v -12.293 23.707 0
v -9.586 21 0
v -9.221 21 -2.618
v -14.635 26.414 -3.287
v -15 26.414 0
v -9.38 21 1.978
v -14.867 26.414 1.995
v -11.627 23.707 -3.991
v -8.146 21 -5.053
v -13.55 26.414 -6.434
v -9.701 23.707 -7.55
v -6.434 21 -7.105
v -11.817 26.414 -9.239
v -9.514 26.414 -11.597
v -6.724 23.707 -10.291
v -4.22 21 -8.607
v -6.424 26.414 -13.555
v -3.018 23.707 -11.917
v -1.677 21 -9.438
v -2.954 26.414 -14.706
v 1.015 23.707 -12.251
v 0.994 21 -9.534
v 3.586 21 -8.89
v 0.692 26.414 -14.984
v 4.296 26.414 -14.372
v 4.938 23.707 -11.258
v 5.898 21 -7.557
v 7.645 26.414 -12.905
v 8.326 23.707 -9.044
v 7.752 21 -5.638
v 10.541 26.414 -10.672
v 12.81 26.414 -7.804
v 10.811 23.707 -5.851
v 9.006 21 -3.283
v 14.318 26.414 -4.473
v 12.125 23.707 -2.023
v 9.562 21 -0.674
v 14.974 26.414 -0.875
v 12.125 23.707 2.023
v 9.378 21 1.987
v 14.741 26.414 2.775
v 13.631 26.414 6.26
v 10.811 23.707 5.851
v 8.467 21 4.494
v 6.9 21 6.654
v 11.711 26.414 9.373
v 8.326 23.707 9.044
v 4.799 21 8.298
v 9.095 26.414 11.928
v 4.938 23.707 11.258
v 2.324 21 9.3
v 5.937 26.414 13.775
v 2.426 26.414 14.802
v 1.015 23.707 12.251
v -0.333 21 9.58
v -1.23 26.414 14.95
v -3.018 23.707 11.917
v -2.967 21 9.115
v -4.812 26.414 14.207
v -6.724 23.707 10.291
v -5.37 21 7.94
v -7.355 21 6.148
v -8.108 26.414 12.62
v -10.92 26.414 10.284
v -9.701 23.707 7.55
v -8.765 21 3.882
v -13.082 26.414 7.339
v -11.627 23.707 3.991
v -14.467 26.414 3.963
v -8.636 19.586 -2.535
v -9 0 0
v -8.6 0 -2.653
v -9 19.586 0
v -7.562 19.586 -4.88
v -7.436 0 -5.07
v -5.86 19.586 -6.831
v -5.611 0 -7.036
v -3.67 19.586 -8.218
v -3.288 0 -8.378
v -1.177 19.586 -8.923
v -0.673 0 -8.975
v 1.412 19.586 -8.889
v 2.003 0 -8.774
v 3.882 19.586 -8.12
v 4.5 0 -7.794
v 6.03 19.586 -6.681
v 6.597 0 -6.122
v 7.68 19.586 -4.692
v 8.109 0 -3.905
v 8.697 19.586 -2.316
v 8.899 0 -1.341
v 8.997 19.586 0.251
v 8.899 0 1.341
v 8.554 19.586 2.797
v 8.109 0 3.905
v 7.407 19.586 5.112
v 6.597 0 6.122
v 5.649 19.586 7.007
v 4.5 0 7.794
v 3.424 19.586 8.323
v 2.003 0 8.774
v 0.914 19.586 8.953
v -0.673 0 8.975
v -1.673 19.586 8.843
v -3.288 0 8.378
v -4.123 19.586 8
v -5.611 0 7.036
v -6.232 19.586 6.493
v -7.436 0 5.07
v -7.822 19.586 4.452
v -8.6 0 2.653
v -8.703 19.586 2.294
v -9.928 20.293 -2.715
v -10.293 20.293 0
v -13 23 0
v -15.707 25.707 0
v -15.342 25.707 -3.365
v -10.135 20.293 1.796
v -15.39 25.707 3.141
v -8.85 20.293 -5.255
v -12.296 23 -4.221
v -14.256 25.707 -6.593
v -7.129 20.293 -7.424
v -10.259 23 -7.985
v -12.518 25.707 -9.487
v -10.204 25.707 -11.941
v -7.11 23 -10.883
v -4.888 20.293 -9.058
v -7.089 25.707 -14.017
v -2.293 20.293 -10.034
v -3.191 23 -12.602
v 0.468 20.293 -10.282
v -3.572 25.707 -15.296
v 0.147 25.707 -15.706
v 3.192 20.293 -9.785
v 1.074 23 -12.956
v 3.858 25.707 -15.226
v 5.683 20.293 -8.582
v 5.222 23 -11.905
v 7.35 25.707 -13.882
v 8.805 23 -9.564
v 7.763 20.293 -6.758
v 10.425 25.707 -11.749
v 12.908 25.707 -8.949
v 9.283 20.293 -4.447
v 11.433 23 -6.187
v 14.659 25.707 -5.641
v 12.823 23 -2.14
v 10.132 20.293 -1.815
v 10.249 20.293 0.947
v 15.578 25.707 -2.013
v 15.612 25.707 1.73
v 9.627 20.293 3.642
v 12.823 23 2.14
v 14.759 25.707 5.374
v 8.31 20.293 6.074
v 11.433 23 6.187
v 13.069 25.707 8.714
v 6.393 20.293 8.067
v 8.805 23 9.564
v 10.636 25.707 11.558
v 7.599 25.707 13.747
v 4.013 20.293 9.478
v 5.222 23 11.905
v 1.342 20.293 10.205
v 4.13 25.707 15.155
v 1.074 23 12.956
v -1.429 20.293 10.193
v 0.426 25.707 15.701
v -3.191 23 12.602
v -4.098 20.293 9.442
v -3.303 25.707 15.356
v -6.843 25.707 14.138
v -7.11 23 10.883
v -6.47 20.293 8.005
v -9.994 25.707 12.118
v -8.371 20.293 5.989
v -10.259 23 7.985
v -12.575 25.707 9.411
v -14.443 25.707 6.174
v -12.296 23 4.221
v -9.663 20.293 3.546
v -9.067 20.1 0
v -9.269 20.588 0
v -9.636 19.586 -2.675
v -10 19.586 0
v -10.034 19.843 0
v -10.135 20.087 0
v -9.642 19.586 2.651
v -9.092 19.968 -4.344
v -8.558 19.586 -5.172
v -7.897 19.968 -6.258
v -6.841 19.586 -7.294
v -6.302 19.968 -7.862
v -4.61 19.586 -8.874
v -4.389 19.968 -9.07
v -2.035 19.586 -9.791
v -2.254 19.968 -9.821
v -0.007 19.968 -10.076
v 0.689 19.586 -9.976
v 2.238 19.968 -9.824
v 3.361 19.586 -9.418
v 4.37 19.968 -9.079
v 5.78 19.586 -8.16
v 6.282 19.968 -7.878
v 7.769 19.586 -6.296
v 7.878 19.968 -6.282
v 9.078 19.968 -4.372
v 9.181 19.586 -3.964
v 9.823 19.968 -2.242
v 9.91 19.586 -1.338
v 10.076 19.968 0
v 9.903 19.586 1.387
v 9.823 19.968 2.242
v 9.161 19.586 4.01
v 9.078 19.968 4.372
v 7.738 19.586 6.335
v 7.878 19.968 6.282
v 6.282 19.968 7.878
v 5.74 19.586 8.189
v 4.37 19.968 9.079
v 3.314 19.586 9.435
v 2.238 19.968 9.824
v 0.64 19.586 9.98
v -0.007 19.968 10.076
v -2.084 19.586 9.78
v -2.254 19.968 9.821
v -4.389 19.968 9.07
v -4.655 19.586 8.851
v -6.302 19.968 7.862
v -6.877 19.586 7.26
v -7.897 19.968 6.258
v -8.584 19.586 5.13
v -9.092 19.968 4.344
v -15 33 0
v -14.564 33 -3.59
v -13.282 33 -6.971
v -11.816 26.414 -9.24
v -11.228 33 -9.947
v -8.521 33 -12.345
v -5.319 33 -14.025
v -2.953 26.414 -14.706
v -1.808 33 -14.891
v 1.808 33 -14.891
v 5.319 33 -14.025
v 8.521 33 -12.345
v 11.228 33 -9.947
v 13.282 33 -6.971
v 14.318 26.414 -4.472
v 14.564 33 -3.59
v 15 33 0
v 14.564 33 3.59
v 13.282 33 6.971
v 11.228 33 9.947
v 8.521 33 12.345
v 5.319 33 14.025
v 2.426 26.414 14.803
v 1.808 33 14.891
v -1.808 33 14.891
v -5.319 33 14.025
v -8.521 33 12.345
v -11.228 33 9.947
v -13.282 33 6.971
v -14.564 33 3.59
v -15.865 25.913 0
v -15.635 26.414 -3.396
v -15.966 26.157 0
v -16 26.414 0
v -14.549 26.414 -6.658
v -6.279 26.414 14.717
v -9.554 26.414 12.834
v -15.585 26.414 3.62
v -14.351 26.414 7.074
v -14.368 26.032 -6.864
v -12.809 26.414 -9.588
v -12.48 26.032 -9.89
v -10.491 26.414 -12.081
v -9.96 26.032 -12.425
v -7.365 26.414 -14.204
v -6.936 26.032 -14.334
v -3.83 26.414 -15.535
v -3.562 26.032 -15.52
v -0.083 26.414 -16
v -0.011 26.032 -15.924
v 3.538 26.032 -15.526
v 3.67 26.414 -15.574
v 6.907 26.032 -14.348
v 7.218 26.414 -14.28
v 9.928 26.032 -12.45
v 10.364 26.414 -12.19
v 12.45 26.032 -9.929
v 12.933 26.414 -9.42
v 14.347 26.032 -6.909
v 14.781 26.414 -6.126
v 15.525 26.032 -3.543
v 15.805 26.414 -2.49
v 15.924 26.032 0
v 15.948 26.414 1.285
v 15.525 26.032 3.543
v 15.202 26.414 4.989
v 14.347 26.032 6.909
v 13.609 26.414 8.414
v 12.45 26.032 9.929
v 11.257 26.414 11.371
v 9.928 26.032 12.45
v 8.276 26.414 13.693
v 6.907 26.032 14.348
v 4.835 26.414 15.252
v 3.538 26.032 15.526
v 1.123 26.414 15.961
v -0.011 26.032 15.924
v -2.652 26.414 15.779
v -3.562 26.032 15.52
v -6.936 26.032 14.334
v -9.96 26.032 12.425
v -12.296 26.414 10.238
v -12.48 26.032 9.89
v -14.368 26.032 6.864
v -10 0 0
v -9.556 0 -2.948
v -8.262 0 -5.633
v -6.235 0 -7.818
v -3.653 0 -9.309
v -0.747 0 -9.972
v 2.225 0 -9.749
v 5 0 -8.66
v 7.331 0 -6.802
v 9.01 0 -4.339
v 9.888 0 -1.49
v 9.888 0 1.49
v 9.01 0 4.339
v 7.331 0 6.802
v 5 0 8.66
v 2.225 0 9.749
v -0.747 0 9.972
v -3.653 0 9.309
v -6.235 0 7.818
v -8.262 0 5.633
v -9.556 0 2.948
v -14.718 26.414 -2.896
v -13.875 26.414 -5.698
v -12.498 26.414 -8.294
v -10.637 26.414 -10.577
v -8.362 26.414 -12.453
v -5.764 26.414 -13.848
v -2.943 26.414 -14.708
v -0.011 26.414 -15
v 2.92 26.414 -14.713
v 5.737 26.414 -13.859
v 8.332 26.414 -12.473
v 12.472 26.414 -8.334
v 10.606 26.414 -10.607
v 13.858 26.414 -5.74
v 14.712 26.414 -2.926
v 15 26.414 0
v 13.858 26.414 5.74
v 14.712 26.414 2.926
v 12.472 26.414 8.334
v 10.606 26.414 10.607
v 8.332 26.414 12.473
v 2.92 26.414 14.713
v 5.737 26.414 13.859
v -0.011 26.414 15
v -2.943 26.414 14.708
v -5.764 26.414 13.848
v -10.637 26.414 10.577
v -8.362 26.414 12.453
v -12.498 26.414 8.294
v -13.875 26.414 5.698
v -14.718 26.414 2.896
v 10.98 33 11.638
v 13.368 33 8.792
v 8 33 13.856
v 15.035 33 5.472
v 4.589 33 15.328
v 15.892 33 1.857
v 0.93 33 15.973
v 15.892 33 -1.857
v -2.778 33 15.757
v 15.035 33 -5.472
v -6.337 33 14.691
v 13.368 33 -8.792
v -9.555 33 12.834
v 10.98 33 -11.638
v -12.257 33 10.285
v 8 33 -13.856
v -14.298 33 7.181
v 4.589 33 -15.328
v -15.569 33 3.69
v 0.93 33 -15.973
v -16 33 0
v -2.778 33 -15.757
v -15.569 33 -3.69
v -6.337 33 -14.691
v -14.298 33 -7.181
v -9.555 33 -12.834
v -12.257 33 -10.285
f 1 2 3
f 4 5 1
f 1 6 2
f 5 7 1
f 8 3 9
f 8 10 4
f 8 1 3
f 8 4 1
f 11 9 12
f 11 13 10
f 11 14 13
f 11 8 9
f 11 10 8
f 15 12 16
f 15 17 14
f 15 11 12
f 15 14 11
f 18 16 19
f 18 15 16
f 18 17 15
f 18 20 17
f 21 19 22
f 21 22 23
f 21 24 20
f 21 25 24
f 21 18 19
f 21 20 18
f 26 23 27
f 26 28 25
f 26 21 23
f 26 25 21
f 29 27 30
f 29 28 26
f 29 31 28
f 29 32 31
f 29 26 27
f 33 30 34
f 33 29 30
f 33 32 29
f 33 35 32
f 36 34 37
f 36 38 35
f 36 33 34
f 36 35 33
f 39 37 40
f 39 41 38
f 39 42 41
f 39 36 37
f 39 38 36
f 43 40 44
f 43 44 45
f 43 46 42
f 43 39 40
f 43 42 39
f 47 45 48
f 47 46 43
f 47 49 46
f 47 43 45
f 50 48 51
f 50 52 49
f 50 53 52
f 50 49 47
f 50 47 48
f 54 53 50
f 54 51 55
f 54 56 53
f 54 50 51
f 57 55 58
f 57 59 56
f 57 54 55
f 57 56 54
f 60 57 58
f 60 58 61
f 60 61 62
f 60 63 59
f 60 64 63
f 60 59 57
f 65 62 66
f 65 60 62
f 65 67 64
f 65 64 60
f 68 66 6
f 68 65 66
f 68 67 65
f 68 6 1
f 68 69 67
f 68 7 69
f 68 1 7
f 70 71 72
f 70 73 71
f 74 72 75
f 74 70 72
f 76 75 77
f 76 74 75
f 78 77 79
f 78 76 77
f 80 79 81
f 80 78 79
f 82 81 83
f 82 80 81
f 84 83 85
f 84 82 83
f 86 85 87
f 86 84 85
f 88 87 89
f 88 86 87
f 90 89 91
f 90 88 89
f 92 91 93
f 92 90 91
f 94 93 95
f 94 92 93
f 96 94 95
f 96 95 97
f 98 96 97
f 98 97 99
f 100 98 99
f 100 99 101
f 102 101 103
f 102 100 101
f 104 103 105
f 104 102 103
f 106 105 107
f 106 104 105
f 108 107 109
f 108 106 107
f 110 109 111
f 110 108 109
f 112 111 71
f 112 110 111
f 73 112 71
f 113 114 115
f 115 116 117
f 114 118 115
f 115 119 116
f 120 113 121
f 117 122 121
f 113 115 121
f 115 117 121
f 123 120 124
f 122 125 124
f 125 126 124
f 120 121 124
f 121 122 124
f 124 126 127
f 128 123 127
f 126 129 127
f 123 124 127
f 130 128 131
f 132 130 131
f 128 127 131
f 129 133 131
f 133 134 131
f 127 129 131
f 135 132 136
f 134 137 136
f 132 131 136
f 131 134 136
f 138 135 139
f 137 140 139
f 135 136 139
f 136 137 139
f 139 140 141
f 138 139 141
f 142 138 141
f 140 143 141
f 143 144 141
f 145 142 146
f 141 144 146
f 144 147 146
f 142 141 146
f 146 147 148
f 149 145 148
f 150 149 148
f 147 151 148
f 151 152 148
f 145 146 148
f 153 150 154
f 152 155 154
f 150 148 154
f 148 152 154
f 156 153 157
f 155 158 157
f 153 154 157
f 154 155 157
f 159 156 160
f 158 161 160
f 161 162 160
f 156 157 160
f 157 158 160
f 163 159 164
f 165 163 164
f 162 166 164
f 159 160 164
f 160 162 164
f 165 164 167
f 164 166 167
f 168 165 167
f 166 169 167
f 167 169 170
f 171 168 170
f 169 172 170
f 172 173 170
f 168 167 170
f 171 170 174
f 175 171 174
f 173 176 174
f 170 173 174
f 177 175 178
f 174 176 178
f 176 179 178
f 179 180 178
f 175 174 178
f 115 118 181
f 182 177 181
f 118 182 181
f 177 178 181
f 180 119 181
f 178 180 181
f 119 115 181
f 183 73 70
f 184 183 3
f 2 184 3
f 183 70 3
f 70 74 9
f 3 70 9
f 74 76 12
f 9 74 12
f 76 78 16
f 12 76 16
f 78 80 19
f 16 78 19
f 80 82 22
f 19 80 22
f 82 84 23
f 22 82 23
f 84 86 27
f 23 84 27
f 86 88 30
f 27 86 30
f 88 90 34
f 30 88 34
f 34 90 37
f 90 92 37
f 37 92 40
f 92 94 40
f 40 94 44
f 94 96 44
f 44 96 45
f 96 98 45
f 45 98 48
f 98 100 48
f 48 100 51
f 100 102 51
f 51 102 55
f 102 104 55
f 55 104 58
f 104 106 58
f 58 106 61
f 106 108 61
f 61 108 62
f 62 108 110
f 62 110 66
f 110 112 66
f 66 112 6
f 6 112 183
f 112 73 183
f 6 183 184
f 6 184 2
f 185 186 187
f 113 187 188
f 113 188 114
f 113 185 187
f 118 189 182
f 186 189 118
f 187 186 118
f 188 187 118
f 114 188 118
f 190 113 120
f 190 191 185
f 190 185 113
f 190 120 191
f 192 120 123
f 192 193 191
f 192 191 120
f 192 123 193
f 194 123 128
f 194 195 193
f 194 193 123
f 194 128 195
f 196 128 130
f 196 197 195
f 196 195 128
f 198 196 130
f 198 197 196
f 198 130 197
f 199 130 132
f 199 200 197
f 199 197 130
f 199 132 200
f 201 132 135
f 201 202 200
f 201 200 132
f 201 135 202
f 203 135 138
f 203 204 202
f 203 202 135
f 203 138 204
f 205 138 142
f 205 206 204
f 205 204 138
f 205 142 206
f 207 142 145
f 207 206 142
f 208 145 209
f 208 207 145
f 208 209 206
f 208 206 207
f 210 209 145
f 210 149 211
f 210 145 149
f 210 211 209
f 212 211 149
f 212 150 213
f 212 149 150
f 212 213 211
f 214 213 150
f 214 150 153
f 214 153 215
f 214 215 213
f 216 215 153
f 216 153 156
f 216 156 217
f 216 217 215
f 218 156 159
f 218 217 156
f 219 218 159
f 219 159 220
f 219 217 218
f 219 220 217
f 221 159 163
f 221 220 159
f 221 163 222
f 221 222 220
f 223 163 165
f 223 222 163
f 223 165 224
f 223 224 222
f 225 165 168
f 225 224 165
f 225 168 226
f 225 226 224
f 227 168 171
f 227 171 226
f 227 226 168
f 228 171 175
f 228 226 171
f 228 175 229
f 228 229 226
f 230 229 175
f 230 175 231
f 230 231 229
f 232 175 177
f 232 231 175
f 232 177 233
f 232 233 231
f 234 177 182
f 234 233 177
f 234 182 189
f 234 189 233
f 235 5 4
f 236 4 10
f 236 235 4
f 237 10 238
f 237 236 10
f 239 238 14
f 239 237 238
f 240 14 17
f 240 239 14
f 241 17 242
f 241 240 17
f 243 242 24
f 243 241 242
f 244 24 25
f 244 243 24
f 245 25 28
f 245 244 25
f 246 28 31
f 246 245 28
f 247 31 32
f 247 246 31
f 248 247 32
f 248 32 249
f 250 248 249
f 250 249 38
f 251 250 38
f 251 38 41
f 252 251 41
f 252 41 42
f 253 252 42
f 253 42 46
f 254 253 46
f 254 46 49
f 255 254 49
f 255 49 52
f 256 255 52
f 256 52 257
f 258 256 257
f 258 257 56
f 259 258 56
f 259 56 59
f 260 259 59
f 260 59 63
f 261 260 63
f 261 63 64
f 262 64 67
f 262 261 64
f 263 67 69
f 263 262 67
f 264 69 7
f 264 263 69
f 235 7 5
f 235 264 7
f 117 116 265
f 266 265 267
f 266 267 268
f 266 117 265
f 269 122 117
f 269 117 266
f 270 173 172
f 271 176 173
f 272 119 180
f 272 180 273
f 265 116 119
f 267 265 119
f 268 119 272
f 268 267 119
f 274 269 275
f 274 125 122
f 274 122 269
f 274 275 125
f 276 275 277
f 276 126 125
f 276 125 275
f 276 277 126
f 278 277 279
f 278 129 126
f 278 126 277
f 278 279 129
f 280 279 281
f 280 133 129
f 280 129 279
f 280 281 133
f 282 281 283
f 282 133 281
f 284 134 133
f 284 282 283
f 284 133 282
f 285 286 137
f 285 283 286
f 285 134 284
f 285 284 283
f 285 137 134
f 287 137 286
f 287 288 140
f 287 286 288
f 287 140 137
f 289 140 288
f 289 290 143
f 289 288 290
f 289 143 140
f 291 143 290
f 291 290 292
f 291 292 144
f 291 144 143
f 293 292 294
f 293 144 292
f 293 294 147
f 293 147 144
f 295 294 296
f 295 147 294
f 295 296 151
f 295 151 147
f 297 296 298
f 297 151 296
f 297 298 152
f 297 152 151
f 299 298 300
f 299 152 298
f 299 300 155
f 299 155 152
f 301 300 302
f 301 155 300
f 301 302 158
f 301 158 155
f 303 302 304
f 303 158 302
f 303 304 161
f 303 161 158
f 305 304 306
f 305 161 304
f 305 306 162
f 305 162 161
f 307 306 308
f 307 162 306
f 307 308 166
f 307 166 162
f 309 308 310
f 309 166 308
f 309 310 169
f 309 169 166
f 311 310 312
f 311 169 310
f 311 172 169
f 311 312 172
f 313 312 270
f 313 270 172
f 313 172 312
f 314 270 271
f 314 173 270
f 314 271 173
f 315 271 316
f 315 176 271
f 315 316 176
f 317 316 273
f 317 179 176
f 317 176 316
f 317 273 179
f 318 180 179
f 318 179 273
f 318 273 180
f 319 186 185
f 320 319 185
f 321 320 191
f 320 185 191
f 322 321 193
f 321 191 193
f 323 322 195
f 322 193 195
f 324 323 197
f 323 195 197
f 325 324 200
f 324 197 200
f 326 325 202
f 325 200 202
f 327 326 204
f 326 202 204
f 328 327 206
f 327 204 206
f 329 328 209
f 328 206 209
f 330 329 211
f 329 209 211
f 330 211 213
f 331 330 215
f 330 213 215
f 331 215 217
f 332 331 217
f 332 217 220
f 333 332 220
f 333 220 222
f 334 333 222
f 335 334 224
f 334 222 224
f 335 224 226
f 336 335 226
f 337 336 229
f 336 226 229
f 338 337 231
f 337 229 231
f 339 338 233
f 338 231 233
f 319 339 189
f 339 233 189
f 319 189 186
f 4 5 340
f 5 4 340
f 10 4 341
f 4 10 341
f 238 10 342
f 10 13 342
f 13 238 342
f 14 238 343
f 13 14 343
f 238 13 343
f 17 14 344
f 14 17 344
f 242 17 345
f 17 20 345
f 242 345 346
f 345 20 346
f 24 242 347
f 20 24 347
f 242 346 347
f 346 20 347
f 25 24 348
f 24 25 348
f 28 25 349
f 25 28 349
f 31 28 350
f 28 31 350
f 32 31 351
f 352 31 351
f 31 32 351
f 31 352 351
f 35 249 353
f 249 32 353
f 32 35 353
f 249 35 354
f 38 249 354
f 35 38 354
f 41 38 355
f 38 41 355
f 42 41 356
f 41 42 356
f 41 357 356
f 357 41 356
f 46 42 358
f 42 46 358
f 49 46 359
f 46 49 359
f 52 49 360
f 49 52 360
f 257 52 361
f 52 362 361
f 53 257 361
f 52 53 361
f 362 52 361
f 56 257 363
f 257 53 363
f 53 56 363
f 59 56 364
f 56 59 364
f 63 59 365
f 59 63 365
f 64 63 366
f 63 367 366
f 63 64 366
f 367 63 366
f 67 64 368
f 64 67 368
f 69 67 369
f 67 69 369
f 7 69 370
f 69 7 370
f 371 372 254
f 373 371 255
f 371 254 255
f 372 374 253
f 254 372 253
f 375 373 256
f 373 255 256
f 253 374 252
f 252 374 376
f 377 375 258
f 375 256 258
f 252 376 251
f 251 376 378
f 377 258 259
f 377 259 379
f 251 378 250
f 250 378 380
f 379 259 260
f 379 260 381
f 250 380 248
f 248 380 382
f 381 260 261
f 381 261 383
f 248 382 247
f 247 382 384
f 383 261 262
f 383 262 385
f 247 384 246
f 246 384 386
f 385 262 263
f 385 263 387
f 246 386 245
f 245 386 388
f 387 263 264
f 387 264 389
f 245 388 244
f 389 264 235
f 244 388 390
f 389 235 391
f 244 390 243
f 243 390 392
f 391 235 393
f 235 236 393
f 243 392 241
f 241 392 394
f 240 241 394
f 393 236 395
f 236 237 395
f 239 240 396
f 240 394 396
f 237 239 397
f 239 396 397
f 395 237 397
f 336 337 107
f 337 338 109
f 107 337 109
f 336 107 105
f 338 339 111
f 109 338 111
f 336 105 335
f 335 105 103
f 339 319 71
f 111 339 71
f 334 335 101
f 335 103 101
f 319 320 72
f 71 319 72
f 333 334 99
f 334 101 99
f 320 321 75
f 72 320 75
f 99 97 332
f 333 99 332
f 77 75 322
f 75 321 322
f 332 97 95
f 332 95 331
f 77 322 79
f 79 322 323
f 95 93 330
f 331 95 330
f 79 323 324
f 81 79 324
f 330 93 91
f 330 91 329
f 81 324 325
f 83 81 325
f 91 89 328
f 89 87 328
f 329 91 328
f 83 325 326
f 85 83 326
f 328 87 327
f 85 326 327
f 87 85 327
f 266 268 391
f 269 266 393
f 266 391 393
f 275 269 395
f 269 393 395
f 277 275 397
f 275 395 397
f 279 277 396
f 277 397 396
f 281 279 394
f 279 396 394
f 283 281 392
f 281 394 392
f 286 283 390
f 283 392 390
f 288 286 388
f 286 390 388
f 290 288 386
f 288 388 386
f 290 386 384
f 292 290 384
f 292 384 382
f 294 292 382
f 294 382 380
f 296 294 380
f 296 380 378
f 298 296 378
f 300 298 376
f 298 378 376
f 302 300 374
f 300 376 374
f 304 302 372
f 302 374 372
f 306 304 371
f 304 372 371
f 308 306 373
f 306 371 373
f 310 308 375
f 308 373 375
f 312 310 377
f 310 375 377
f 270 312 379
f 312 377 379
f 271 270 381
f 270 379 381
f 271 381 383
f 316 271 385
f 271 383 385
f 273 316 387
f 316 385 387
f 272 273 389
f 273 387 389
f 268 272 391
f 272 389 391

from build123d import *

# Parameters (mm, degrees)
FILLET_1_R = 1
SHELL_1_T  = -1


with BuildPart() as part:
    # Эскиз1 → Повернуть1 (revolve)
    with BuildSketch(Plane.XY):
        Polygon((0, 0), (-10, 0), (-10, 20), (-16, 26), (-16, 33), (0, 33), align=None)
    revolve(axis=Axis((0, 33, 0), (0, -1, 0)))

    # Скругление1
    fillet_1_edges = [part.edges().sort_by_distance(p)[0] for p in [
        (16, 26, 0),
        (10, 20, 0),
    ]]
    fillet(fillet_1_edges, radius=FILLET_1_R)

    # Оболочка1
    shell_1_openings = [part.faces().sort_by_distance(p)[0] for p in [
        (0, 33, 0),
        (0, 0, 0),
    ]]
    offset(amount=SHELL_1_T, openings=shell_1_openings, kind=Kind.INTERSECTION)


solid = part.part
